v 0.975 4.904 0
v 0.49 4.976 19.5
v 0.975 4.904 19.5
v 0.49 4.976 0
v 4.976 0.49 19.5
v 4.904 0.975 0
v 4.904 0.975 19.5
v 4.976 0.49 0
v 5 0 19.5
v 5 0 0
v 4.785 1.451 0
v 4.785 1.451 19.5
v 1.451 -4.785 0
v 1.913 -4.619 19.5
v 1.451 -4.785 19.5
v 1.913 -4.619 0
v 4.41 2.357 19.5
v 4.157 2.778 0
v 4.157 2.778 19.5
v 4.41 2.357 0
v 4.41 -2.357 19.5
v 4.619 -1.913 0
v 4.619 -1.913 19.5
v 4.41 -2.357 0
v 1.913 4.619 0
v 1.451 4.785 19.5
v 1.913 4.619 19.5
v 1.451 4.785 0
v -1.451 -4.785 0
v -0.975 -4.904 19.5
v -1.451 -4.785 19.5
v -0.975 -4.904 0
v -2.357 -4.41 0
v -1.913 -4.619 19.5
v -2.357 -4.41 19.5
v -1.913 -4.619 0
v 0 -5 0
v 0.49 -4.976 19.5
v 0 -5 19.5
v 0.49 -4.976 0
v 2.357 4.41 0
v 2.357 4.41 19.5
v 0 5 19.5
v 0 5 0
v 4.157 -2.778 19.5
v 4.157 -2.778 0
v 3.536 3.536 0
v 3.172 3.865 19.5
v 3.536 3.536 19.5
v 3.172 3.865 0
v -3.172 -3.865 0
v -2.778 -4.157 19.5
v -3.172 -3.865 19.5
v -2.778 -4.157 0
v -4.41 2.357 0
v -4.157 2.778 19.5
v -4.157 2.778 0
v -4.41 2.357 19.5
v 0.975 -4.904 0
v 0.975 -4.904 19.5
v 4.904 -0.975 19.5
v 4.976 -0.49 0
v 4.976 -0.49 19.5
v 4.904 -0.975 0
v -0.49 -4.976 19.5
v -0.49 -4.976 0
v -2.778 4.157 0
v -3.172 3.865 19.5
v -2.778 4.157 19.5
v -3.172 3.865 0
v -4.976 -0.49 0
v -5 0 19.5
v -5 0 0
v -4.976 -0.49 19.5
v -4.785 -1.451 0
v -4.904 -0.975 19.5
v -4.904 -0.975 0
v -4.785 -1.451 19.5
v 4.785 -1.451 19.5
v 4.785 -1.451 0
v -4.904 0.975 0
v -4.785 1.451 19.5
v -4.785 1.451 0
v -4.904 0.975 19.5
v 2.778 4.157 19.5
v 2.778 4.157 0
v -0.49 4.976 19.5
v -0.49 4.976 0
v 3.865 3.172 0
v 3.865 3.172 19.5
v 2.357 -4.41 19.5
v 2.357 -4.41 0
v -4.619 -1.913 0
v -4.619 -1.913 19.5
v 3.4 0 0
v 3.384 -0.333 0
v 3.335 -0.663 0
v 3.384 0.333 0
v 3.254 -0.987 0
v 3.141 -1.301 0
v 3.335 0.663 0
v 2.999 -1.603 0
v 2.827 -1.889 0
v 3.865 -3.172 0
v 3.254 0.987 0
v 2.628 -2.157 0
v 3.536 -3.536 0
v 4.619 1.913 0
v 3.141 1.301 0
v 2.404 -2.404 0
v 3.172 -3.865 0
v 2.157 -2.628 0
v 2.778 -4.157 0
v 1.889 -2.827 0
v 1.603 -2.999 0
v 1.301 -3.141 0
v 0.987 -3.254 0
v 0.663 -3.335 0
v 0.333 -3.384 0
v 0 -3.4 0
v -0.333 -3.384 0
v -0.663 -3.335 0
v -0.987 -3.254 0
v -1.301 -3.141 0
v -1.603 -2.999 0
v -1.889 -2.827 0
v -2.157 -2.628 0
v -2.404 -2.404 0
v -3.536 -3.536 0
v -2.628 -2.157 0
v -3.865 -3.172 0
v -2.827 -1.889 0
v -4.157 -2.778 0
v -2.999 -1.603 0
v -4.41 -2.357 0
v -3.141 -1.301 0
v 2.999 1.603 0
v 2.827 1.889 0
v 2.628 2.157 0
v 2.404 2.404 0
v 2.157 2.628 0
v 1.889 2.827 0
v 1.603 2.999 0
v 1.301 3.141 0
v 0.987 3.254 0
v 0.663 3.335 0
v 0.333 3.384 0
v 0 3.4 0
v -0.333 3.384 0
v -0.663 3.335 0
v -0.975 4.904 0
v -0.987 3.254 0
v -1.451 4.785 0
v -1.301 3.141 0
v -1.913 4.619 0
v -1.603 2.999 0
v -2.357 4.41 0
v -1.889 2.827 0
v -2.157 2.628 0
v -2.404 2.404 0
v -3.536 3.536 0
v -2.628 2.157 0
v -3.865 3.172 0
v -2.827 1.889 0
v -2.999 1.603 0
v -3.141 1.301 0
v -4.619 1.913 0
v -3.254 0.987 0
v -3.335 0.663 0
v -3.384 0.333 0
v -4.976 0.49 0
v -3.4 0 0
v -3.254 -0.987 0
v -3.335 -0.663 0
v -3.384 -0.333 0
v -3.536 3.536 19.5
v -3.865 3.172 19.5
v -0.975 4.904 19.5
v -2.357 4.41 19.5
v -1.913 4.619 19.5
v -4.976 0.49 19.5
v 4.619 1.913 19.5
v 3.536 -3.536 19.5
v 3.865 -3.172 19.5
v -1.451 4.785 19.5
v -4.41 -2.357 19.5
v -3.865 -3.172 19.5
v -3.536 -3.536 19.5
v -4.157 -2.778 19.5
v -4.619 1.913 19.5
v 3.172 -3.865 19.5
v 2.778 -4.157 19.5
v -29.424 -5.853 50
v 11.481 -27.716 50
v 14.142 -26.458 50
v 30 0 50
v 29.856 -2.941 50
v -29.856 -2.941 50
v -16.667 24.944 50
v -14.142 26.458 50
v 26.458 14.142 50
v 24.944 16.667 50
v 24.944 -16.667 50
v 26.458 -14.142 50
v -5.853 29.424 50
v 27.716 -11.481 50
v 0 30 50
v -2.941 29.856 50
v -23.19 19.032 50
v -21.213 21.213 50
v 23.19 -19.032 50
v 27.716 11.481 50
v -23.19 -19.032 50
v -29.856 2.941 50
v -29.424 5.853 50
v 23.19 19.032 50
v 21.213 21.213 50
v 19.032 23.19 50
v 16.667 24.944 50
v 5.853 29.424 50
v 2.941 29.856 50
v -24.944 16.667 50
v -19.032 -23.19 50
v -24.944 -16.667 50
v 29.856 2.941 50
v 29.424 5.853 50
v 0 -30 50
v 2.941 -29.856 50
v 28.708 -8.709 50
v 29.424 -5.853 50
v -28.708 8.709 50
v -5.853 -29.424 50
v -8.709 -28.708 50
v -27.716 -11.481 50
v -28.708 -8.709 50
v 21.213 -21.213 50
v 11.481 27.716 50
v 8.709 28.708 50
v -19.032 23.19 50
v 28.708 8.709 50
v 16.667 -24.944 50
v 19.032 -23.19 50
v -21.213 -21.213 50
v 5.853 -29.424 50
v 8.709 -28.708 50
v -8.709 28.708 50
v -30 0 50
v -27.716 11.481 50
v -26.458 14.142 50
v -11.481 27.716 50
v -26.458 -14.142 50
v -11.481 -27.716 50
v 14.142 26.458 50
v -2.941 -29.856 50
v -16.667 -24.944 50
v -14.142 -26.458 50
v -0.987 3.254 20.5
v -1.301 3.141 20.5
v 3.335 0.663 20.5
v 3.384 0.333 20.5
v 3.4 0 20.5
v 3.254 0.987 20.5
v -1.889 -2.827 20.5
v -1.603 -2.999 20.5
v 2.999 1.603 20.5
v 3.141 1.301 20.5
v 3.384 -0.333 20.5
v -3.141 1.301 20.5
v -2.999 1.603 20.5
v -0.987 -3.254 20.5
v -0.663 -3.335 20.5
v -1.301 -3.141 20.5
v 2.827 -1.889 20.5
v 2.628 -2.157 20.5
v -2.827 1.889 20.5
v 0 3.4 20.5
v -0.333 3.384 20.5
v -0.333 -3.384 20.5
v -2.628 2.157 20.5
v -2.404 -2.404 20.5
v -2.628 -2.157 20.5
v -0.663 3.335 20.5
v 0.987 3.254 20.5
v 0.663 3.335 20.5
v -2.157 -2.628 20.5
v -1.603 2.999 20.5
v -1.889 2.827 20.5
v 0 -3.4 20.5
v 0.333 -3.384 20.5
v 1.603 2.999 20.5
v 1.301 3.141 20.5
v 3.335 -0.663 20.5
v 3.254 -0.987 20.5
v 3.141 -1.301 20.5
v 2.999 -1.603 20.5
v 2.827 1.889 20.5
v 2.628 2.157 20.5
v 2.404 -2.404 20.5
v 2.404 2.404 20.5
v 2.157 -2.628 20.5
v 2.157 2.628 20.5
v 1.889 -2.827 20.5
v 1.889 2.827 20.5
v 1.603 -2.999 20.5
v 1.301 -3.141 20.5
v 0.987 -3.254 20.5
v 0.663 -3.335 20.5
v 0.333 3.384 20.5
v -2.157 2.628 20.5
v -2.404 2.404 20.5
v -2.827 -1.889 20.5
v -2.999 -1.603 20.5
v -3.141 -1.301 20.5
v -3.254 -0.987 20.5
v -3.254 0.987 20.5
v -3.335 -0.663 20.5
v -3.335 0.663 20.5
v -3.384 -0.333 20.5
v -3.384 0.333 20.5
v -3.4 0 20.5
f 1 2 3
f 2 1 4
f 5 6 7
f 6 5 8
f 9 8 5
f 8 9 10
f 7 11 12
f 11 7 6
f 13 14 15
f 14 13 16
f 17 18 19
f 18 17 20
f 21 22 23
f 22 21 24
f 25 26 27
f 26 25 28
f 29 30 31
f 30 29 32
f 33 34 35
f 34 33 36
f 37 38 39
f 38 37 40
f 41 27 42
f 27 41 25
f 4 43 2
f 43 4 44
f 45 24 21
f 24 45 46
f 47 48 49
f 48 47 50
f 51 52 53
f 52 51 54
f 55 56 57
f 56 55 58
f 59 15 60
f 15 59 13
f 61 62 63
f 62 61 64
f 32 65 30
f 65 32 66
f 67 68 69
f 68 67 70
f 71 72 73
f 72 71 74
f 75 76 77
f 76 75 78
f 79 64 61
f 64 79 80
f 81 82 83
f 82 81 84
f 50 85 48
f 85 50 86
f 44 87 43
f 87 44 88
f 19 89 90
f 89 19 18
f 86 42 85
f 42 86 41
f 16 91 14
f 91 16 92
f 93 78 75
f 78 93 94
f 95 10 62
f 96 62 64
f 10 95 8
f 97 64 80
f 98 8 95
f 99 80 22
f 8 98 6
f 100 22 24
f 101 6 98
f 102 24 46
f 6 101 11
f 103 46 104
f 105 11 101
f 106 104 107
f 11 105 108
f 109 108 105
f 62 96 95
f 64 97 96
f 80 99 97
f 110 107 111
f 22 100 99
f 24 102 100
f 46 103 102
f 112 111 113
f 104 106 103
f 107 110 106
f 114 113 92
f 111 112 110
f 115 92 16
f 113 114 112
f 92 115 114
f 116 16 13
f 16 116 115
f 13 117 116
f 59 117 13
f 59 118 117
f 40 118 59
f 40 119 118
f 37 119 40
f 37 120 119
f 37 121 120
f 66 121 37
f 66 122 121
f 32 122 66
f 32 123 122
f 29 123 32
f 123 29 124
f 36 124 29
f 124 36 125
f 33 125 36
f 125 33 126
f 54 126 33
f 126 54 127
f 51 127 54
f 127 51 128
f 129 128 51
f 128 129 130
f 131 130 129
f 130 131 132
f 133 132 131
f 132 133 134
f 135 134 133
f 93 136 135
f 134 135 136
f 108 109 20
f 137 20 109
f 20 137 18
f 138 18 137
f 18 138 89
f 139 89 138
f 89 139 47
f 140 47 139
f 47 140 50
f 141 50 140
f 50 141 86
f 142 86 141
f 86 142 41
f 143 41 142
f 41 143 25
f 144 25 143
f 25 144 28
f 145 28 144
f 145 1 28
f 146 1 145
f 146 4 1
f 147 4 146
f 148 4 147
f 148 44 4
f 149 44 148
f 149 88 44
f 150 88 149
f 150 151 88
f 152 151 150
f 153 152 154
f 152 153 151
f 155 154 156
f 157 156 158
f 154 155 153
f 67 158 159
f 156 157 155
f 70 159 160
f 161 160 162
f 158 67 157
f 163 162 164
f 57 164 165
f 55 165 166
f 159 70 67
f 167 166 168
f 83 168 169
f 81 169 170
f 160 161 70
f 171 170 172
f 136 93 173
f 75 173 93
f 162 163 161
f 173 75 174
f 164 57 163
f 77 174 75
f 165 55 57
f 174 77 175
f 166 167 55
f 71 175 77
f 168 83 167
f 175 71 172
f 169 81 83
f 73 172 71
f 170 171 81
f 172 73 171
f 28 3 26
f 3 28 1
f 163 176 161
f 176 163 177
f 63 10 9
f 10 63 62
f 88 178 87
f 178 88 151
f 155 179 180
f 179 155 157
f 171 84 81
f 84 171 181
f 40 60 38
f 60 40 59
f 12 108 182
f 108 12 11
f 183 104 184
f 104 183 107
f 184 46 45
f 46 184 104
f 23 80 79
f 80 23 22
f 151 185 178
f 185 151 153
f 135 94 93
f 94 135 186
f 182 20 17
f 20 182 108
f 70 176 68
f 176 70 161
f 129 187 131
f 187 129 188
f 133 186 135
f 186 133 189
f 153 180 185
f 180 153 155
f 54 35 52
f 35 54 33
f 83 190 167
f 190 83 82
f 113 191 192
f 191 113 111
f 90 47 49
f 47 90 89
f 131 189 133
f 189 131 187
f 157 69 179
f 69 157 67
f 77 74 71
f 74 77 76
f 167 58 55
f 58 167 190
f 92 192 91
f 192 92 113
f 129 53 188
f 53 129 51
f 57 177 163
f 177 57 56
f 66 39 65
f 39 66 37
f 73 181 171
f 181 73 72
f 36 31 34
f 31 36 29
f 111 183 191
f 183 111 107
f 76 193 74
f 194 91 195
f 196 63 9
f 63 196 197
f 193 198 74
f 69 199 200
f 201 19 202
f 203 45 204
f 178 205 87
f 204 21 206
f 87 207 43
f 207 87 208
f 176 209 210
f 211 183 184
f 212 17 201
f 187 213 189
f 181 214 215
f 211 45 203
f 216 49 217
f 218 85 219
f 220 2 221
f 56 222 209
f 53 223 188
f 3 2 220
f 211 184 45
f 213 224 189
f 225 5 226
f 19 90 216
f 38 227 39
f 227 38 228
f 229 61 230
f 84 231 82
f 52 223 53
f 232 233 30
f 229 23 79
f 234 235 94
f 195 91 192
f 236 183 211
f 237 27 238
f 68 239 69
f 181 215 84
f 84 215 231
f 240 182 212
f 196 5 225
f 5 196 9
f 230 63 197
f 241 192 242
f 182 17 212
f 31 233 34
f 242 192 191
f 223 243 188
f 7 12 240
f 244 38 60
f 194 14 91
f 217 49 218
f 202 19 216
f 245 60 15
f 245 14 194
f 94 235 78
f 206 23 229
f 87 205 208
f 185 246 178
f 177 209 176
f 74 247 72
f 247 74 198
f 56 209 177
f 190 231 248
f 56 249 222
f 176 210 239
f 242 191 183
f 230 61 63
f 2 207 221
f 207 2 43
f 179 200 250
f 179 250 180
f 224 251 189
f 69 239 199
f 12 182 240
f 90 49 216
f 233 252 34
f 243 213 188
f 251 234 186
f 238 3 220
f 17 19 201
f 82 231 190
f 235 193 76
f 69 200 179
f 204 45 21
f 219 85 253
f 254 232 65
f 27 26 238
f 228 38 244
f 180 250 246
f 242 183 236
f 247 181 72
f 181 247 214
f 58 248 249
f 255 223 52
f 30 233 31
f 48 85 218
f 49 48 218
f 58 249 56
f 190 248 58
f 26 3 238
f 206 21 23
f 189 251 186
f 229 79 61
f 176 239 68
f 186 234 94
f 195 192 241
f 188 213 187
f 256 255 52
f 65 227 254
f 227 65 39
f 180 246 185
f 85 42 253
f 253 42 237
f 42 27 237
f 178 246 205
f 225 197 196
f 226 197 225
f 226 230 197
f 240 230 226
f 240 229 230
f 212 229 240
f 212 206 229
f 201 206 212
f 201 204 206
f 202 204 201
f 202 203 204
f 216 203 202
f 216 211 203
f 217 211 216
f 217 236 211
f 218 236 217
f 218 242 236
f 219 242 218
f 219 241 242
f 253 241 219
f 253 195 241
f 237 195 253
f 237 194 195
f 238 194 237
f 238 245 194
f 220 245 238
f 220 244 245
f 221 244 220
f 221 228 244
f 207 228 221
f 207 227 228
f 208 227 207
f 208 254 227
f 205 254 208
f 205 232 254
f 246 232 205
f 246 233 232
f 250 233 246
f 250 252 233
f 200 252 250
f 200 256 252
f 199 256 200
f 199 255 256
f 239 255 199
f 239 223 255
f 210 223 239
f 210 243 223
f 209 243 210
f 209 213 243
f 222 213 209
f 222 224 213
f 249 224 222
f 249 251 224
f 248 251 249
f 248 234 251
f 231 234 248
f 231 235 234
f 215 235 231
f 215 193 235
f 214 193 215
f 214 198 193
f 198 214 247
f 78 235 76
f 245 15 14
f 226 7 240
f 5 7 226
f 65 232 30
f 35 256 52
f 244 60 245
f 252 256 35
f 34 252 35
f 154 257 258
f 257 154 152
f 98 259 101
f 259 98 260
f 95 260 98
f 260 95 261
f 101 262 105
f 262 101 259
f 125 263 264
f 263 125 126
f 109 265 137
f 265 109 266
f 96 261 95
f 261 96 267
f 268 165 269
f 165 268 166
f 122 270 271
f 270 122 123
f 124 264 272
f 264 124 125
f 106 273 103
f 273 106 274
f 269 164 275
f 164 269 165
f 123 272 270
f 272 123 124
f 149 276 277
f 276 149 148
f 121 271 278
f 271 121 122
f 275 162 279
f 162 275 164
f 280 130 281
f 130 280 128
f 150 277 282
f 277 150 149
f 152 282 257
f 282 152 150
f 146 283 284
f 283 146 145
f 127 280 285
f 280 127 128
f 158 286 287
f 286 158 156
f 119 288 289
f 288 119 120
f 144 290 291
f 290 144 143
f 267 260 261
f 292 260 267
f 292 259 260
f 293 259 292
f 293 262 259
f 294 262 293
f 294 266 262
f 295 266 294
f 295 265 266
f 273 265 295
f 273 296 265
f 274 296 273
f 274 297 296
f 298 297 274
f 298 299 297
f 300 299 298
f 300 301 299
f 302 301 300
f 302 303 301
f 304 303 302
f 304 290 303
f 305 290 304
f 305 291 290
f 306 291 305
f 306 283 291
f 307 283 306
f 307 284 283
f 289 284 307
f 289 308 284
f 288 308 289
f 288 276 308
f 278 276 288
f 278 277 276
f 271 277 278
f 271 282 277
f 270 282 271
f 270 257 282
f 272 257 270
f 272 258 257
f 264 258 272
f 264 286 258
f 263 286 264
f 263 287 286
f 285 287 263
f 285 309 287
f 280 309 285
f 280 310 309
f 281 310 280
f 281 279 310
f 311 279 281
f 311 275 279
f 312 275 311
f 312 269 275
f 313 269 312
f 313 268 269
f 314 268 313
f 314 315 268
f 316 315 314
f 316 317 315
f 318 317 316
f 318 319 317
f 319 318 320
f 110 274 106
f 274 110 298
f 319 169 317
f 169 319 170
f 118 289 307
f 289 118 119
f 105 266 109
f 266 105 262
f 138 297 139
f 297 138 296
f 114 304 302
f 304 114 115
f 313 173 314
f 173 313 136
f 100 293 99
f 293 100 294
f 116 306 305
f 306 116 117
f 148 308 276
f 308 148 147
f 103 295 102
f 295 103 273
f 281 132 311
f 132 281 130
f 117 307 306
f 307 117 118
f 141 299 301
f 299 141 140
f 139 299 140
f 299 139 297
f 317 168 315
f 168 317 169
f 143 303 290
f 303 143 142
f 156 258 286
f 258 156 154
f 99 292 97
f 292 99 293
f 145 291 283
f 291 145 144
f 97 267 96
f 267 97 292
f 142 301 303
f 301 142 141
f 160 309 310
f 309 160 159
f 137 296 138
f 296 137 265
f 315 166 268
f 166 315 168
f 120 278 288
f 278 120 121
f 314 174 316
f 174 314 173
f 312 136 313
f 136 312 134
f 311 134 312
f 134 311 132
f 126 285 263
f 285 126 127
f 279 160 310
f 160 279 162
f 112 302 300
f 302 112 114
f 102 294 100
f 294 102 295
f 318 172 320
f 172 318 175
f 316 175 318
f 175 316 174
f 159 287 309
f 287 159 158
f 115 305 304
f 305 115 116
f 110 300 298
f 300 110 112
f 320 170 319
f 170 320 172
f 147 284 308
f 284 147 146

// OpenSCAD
// Lab funnel - printed upright, wide opening at the top
// Units: mm. Wall thickness 1.6 mm throughout.

$fn = 64;

// ---- Dimensions ----
spout_od     = 10;    // outer diameter of spout (and cone base)
spout_id     = spout_od - 2 * 1.6;  // spout bore = 6.8 mm
spout_h      = 20;    // spout height, z = 0 .. 20

cone_top_od  = 60;    // funnel rim outer diameter
cone_rim_h   = 50;    // rim height, z = 50
cone_h       = cone_rim_h - spout_h;  // cone height = 30 mm

eps          = 0.5;   // overlap for clean booleans

// ---- Model ----
difference() {
    union() {
        // Spout
        translate([0, 0, 0])
            cylinder(h = spout_h, d = spout_od);

        // Cone, slightly sunk into the spout so the union is one solid
        translate([0, 0, spout_h - eps])
            cylinder(h = cone_h + eps, d1 = spout_od, d2 = cone_top_od);
    }

    // Open bottom: cut a hole through the spout
    translate([0, 0, -eps])
        cylinder(h = spout_h + 2 * eps, d = spout_id);
}
